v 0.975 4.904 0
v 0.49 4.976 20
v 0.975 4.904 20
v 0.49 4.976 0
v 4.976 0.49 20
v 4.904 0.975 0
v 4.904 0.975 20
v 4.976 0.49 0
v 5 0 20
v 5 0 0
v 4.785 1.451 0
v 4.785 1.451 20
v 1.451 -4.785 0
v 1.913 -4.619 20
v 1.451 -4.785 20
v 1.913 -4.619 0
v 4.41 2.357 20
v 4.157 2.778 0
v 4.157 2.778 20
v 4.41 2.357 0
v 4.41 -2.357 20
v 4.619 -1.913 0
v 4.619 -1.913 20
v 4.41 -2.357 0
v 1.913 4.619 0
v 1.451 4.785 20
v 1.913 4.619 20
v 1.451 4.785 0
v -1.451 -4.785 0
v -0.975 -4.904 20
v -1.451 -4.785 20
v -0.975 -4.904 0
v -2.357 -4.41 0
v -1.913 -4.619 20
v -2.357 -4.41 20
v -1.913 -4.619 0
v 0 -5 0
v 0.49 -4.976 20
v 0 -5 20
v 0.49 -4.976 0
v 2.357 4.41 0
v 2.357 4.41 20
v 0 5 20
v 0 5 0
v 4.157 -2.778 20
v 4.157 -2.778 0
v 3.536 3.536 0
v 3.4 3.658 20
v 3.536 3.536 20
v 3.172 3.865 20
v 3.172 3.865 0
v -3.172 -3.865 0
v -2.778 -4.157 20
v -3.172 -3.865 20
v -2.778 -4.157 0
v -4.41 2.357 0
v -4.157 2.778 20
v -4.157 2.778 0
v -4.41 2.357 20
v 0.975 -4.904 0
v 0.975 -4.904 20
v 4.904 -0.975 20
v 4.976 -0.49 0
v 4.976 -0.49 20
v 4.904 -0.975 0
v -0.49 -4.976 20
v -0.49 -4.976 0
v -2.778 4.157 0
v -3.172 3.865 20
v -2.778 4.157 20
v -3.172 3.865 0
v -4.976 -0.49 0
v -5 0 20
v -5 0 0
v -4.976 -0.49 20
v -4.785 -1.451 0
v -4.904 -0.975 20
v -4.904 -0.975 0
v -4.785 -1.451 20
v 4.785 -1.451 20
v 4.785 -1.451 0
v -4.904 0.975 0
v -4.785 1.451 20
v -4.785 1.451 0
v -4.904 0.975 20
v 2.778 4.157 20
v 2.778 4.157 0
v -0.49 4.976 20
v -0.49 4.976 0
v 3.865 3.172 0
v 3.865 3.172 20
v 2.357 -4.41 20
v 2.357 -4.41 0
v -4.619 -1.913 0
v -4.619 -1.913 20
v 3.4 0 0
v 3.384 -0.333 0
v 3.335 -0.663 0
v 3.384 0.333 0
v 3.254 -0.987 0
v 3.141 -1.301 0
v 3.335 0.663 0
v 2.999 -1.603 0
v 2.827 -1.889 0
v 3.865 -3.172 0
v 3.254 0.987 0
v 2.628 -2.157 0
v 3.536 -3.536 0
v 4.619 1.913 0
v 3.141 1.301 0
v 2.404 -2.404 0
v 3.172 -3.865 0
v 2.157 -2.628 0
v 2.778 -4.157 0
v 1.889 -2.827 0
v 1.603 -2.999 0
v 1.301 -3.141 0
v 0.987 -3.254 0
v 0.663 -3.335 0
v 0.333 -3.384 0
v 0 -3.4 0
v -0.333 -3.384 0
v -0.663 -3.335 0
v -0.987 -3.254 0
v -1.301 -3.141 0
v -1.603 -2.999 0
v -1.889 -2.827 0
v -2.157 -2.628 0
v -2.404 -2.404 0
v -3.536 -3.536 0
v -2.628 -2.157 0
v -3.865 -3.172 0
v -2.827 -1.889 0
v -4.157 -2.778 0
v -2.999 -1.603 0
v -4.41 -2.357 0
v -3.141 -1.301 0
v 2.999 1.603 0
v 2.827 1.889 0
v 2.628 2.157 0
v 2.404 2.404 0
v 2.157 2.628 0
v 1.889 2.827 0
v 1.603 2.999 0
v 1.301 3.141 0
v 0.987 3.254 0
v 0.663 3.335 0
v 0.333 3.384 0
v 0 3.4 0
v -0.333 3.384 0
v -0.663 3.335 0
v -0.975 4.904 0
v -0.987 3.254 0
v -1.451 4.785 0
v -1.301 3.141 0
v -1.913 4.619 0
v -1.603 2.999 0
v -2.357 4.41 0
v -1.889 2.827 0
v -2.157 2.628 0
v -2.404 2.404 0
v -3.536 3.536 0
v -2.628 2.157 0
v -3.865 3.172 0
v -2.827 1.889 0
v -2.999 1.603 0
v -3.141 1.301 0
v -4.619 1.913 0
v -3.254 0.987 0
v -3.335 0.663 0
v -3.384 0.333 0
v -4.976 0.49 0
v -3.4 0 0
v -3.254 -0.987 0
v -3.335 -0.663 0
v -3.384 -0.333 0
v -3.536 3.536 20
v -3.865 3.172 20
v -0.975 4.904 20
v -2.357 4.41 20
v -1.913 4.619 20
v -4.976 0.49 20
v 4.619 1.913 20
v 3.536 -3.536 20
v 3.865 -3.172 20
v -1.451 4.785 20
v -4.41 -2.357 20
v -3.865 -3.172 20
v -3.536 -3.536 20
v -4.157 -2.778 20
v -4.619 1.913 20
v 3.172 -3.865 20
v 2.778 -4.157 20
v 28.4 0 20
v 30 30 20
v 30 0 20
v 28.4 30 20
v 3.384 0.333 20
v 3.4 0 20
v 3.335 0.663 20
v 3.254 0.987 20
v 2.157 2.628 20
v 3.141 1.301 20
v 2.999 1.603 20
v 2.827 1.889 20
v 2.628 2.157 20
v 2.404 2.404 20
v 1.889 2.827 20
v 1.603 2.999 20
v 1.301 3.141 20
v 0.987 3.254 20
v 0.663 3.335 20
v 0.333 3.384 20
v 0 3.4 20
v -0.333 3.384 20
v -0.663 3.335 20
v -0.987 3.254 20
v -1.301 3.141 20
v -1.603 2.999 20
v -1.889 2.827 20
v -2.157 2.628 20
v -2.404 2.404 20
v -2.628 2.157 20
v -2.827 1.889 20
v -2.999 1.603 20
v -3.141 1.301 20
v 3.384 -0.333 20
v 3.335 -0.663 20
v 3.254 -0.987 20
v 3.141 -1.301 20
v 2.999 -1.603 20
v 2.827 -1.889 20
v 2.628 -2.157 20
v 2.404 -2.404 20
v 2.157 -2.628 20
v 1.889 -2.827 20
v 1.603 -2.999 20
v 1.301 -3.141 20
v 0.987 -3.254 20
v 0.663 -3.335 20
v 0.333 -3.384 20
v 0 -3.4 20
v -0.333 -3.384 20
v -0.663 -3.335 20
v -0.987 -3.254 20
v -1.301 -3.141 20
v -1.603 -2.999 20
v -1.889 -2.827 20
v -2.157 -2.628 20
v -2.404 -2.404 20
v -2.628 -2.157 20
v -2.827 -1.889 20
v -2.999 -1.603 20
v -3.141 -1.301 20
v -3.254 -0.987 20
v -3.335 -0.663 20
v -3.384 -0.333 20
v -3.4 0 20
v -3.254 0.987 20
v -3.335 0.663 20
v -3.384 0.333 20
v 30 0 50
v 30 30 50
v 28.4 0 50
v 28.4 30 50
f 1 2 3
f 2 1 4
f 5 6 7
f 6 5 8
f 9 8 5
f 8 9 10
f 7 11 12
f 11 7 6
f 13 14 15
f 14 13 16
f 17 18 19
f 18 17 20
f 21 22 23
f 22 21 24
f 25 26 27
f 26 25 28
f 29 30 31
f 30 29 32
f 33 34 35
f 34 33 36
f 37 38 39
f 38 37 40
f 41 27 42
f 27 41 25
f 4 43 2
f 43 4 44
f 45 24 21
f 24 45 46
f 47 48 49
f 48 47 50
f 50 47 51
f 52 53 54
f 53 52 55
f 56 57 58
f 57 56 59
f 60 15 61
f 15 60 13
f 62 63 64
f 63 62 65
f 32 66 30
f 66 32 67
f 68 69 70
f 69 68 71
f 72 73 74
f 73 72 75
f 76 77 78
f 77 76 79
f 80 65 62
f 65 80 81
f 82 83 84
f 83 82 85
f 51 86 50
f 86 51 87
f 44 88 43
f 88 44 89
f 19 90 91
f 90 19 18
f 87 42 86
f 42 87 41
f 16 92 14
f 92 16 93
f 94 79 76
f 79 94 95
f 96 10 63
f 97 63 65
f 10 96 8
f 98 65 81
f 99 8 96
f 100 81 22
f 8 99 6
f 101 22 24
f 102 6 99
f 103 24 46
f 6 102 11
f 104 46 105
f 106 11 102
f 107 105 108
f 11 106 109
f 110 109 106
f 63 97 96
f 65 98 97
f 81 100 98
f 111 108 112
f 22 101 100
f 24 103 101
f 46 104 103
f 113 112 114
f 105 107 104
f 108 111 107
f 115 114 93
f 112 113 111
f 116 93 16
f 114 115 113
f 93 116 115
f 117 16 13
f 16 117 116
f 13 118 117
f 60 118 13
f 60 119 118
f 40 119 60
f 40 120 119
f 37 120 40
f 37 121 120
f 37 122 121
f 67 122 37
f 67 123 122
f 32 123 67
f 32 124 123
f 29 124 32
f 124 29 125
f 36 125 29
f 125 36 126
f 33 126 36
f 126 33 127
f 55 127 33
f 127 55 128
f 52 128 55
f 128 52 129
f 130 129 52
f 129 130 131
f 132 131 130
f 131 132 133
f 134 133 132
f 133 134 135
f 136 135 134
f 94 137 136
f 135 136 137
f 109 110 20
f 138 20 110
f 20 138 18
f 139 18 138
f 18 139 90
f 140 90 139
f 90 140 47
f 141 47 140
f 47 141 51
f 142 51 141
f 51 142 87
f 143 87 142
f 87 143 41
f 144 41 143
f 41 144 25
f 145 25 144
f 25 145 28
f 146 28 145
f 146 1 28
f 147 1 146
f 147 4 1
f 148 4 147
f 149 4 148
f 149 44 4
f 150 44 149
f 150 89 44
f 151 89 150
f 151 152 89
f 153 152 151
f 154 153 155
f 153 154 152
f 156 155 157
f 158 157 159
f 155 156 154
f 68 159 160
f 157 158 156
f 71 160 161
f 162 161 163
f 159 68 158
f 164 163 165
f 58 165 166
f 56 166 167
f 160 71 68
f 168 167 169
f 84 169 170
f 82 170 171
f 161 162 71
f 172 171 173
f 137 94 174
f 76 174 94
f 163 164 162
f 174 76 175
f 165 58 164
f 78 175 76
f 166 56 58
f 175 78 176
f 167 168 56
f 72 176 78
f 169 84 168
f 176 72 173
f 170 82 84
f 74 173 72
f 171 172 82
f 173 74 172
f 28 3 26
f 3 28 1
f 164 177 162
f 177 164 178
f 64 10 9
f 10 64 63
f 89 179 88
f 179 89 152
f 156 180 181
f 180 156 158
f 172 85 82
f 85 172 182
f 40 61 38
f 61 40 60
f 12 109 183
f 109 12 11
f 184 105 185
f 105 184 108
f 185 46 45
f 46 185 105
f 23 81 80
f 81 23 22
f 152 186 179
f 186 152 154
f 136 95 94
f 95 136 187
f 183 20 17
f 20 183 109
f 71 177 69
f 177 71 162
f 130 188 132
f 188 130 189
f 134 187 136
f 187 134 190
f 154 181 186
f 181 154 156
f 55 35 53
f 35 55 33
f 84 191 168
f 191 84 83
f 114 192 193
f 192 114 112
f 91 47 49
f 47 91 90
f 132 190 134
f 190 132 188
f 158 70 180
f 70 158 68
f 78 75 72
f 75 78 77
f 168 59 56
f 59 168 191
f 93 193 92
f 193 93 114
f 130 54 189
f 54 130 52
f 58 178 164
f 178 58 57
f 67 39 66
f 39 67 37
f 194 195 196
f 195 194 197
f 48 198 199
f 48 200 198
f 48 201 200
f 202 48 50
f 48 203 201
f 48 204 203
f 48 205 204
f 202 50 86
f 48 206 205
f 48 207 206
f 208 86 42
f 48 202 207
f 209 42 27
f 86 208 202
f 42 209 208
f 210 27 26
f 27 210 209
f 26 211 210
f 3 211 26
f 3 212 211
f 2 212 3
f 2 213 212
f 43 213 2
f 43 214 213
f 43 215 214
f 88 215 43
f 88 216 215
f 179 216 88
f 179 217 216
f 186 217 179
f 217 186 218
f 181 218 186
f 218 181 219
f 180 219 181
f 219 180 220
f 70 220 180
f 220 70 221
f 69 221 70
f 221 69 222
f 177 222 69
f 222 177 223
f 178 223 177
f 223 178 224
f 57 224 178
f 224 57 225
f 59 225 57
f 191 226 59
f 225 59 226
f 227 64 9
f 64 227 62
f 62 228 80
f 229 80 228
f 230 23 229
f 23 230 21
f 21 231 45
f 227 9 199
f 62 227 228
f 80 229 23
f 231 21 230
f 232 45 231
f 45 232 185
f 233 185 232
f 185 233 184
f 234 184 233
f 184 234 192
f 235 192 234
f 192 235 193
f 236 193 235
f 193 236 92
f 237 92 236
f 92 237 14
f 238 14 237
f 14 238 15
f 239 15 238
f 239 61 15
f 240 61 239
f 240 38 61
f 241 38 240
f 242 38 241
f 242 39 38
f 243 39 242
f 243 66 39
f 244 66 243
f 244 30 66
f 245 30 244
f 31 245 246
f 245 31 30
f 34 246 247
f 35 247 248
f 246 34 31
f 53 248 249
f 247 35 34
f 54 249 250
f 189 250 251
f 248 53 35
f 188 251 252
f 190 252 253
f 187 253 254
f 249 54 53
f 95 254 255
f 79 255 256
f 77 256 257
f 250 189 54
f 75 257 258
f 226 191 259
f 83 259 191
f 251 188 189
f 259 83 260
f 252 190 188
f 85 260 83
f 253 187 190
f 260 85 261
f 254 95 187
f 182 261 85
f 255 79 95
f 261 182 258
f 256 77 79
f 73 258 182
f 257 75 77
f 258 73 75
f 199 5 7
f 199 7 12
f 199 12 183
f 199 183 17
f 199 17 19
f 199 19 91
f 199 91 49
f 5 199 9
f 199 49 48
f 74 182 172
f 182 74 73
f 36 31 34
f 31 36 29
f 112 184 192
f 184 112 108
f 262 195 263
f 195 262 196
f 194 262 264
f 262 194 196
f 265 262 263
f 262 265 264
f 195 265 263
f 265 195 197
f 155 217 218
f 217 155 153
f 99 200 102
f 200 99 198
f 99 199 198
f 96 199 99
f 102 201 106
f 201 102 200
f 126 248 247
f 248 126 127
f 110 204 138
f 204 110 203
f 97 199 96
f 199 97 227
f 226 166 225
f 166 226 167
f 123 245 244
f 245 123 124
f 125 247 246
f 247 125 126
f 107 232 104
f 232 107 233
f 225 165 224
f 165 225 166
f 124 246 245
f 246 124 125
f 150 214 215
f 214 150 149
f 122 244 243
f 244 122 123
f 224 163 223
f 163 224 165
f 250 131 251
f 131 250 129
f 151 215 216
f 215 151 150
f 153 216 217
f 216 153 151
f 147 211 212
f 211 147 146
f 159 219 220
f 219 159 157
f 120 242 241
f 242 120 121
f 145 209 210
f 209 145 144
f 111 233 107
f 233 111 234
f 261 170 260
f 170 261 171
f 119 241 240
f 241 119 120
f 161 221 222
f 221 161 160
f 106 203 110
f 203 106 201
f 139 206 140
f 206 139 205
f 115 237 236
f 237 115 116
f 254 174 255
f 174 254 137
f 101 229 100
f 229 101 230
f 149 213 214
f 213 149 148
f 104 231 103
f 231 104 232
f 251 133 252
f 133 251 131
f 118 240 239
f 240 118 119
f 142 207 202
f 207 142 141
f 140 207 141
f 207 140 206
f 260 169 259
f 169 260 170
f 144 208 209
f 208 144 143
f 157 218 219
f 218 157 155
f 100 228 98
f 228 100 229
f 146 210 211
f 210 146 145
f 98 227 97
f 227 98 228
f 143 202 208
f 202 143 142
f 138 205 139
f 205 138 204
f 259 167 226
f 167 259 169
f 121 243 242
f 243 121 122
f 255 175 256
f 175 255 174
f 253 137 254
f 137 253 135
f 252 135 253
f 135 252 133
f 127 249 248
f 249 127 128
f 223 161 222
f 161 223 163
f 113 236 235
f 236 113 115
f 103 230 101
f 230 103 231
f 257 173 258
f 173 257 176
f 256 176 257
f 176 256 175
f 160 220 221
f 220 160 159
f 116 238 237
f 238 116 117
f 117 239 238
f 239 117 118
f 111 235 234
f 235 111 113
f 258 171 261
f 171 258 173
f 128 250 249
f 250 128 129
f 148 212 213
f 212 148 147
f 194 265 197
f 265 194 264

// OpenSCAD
// Lab Funnel - A straight spout tube with a conical funnel top.
// Printed upright (wide opening at top), resting on XY plane at z=0.

// Dimensions
spout_od    = 10;      // Outer diameter of straight spout
spout_id    = 6.8;     // Inner diameter of straight spout (10 - 2*1.6)
spout_len   = 20;      // Length of straight spout (z=0 to z=20)
funnel_start_od = 10;  // Outer diameter at start of cone (z=20)
funnel_end_od  = 60;   // Outer diameter at rim (z=50)
funnel_height = 30;    // Height of cone section (50 - 20)
wall_thick   = 1.6;    // Wall thickness everywhere

// Derived dimensions
funnel_end_id = funnel_end_od - 2 * wall_thick; // 56.8 mm

$fn = 64;

// Build the solid part
difference() {
    // 1. The outer shell (Union of spout and cone)
    union() {
        // Straight spout tube
        translate([0, 0, 0]) 
            cylinder(h = spout_len, d = spout_od);
        
        // Conical funnel top
        translate([0, 0, spout_len]) 
            linear_extrude(height = funnel_height, convexity = 3) 
                polygon([
                    [spout_od / 2, 0],
                    [funnel_end_od / 2, 0],
                    [funnel_end_od / 2, funnel_height],
                    [spout_od / 2, funnel_height]
                ]);
    }
    
    // 2. The inner void (Difference to create the bore)
    // We subtract the inner shapes from the outer shell.
    // To ensure clean cuts, we extend the inner shapes slightly past the boundaries.
    
    // Inner straight spout
    translate([0, 0, 0]) 
        cylinder(h = spout_len + 0.1, d = spout_id);
    
    // Inner conical funnel
    translate([0, 0, spout_len]) 
        linear_extrude(height = funnel_height + 0.1, convexity = 3) 
            polygon([
                [spout_id / 2, 0],
                [funnel_end_id / 2, 0],
                [funnel_end_id / 2, funnel_height],
                [spout_id / 2, funnel_height]
            ]);
}
